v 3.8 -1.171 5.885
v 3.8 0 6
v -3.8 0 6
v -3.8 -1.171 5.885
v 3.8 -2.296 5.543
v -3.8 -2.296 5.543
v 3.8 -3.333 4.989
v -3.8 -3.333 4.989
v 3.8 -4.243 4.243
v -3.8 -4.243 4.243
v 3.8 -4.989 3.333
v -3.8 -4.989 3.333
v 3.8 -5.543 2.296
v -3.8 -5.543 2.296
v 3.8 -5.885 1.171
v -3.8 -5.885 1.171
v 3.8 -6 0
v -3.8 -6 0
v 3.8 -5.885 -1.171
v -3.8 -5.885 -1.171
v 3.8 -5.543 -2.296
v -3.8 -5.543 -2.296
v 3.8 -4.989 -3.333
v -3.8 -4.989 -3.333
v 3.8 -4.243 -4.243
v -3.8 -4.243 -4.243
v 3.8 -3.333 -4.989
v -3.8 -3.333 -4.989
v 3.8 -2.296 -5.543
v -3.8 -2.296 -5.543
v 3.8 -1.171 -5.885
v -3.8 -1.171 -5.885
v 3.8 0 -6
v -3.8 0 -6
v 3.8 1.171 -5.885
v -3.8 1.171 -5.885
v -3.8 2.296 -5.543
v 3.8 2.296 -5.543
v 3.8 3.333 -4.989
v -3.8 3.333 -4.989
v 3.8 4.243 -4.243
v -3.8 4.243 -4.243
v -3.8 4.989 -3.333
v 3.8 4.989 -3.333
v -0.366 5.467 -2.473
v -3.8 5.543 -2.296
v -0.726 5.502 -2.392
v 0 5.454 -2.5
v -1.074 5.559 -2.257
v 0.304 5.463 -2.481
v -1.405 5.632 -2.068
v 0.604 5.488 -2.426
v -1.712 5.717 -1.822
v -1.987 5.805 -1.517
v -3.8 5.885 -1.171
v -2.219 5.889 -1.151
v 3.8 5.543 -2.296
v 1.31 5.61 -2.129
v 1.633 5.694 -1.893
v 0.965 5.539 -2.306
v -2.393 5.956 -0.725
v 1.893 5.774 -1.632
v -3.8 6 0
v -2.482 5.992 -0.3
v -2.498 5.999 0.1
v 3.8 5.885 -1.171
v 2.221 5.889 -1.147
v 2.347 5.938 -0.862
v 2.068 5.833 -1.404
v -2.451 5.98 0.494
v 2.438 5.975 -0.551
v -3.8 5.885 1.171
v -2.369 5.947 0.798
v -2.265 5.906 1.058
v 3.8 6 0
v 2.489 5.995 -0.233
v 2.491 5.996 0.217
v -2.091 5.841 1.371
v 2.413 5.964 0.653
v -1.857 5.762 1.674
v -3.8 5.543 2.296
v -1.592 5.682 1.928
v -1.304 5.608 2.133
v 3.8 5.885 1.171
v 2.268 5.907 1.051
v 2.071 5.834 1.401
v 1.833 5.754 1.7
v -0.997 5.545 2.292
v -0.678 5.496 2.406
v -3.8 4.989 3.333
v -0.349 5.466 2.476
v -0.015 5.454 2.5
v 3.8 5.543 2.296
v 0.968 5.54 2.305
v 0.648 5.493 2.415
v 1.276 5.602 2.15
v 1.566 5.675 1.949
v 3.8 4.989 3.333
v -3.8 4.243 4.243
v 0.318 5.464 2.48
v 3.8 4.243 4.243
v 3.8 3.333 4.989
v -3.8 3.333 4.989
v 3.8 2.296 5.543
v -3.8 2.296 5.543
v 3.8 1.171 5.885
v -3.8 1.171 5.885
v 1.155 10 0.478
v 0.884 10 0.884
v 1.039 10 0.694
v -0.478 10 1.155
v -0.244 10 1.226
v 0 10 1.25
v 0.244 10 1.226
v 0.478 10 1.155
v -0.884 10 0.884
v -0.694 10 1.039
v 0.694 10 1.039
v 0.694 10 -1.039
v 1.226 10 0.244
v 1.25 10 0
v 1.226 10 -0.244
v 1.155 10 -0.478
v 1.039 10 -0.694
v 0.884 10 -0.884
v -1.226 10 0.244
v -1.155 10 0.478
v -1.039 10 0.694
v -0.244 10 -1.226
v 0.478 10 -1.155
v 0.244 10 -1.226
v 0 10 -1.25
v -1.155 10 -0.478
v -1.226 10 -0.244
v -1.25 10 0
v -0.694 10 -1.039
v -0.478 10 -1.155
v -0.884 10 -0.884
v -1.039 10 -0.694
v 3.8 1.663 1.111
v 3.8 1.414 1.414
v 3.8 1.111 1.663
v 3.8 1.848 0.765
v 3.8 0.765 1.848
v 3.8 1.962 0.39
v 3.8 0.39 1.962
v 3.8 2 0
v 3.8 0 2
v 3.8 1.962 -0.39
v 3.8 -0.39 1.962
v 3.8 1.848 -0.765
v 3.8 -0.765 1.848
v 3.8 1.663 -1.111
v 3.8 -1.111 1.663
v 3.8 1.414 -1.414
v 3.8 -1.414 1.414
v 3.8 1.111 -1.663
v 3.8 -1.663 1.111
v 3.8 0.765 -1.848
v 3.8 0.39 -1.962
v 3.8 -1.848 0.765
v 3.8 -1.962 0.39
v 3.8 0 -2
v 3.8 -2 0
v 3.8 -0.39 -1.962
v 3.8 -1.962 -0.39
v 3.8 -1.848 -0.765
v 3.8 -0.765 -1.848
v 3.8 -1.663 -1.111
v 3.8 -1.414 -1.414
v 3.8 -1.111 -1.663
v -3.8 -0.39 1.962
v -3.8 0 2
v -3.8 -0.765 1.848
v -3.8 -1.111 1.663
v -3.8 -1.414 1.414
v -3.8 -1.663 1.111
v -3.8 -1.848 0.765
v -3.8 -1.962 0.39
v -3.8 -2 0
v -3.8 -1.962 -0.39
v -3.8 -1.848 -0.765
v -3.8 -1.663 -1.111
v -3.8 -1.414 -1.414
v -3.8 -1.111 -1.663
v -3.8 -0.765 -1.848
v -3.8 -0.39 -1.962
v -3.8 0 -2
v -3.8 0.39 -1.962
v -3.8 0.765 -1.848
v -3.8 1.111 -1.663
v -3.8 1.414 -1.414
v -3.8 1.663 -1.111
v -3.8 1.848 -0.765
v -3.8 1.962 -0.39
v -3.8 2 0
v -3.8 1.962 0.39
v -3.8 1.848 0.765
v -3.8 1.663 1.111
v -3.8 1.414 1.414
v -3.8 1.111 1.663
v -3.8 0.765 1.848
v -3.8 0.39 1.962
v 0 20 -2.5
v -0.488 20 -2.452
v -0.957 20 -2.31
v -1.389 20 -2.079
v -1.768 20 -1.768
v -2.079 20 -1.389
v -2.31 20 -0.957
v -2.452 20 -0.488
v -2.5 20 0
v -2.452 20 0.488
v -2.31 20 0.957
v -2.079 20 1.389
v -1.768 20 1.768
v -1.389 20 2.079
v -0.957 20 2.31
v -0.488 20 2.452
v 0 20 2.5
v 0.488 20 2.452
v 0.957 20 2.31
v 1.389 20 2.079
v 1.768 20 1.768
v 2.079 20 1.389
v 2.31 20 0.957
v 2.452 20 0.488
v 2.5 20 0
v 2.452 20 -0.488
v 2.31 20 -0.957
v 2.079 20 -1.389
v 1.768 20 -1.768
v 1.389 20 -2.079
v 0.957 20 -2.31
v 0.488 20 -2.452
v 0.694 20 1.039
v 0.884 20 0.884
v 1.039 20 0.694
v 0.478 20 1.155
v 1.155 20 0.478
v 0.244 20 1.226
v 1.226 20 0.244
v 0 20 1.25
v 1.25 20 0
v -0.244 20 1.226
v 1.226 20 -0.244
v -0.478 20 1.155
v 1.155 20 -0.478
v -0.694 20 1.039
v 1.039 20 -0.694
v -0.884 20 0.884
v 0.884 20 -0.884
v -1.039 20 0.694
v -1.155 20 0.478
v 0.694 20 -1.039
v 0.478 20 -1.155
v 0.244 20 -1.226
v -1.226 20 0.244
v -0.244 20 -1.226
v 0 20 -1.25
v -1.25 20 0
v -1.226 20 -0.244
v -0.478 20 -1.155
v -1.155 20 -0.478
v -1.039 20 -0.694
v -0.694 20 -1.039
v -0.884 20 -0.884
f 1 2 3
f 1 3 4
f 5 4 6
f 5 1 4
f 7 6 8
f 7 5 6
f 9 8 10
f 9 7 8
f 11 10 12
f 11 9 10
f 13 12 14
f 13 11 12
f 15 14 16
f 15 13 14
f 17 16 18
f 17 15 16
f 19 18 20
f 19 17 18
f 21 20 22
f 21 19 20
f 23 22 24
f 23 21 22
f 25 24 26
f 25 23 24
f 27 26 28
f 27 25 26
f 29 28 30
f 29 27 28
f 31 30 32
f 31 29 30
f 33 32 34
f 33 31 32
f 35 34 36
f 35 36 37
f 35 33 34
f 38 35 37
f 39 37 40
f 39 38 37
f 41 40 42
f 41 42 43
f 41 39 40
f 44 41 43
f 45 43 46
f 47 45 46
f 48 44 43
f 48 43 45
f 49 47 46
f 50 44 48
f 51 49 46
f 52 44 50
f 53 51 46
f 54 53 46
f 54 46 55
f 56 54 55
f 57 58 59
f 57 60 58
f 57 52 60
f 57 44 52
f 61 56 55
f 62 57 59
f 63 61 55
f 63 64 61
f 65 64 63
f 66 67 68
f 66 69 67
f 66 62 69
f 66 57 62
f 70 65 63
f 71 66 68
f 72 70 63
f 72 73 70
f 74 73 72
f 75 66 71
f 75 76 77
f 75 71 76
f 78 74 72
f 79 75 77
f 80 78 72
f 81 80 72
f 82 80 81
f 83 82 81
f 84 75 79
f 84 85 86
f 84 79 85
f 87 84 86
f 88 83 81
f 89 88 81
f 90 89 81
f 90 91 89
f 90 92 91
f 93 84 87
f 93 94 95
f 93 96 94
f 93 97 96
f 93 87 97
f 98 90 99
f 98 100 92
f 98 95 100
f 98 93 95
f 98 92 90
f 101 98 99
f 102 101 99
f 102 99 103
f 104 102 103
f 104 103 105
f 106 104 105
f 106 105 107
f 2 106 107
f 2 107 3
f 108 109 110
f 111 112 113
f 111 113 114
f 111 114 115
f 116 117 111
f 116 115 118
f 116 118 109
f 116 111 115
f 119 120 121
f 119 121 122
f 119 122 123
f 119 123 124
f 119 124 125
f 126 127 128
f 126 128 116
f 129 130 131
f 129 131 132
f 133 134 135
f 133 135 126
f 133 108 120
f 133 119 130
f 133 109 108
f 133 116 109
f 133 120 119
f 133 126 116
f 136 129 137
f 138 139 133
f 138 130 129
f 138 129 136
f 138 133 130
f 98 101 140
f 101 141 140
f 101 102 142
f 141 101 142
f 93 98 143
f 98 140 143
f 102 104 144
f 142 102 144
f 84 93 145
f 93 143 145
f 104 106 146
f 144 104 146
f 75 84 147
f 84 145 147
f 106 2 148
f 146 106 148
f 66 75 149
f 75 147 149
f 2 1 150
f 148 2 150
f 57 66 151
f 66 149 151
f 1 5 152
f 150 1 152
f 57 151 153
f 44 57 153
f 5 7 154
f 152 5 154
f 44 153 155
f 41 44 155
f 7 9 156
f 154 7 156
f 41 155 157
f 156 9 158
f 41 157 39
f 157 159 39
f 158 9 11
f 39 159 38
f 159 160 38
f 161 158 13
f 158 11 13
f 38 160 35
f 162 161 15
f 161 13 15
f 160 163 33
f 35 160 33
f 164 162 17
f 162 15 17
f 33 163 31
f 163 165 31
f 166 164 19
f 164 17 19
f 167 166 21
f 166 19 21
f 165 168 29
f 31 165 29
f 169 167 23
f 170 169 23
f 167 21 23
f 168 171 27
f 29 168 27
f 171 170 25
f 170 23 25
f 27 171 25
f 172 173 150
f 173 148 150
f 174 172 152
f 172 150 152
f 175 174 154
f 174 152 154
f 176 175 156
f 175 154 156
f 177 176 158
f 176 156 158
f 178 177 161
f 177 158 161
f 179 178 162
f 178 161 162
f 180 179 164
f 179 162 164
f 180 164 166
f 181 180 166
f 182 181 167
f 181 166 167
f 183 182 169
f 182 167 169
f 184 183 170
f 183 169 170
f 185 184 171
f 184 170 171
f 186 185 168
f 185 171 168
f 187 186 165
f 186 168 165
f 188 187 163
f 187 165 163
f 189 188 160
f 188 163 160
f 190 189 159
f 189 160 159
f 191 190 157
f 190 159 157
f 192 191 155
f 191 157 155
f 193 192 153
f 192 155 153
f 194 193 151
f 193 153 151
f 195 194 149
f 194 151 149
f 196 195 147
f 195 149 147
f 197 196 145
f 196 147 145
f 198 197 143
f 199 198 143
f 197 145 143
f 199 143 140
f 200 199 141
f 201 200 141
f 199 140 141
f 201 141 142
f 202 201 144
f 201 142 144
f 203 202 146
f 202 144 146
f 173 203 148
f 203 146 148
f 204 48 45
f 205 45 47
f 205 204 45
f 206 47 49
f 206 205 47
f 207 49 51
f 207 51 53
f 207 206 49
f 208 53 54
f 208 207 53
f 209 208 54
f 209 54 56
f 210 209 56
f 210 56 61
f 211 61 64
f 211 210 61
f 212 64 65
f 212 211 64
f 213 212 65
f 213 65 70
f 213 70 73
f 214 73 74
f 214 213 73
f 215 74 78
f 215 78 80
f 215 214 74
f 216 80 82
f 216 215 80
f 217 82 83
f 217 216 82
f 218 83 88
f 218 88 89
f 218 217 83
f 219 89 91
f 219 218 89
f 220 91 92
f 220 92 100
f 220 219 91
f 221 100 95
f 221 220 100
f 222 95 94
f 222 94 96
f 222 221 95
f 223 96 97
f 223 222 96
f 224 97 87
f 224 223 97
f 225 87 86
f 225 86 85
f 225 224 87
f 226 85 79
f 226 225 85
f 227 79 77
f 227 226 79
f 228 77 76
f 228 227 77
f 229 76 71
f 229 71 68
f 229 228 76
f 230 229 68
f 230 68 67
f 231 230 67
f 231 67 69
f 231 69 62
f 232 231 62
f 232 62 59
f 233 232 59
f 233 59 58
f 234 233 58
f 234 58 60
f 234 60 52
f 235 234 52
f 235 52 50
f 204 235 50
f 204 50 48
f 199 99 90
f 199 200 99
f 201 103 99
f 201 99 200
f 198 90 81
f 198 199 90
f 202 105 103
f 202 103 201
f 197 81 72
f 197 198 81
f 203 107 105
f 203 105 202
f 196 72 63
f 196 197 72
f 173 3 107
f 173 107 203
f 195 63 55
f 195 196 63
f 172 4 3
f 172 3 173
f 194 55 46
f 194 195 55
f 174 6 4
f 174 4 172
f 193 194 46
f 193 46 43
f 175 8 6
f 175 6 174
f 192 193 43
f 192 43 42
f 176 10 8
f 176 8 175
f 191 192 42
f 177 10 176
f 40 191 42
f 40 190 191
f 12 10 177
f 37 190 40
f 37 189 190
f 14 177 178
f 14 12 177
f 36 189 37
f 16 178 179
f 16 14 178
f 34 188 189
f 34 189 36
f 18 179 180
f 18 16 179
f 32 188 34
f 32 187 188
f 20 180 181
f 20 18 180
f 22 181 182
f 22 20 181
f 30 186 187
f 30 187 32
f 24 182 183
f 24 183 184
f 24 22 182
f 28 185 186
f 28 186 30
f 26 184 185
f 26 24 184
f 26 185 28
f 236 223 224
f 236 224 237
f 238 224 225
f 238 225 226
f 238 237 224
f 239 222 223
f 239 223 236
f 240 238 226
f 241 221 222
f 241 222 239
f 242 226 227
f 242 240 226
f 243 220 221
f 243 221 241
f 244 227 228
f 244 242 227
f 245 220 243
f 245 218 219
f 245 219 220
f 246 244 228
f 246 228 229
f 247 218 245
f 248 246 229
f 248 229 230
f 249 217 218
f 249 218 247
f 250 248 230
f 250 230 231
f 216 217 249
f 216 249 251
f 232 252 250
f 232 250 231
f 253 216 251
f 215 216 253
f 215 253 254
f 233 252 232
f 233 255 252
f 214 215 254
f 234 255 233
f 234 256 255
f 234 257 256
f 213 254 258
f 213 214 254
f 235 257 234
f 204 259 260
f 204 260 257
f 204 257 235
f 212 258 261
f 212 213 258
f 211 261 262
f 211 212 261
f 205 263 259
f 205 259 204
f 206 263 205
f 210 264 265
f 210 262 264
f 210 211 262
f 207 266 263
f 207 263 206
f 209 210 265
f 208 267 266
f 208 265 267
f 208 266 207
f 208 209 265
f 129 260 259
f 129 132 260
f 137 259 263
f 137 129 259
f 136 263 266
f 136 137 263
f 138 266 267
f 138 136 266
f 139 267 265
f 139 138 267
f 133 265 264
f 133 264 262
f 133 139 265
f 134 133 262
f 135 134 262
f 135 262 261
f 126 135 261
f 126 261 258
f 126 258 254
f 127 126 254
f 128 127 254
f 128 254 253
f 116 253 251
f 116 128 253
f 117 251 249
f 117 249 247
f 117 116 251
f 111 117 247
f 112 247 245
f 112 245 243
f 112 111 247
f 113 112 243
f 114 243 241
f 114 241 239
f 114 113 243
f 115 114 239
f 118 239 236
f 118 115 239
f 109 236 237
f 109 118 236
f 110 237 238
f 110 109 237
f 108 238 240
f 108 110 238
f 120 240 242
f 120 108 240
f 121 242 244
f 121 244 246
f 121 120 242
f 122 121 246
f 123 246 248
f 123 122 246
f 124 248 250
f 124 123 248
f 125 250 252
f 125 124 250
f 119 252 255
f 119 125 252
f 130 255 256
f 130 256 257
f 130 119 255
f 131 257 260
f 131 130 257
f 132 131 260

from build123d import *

# Parameters (mm, degrees)
EYE_SKETCH_W = 7.6
EYE_SKETCH_H = 4


with BuildPart() as part:
    # Eye Sketch → Eye (revolve)
    with BuildSketch(Plane.XY):
        with Locations((0, 4)):
            Rectangle(EYE_SKETCH_W, EYE_SKETCH_H)
    revolve(axis=Axis((-3000, 0, 0), (1, 0, 0)))

    # Shank Sketch → Shank (revolve)
    with BuildSketch(Plane.XY):
        Polygon((0, 5), (2.5, 5), (2.5, 20), (1.25, 20), (1.25, 10), (0, 10), align=None)
    revolve(axis=Axis((0, -5, 0), (0, 1, 0)))


solid = part.part
